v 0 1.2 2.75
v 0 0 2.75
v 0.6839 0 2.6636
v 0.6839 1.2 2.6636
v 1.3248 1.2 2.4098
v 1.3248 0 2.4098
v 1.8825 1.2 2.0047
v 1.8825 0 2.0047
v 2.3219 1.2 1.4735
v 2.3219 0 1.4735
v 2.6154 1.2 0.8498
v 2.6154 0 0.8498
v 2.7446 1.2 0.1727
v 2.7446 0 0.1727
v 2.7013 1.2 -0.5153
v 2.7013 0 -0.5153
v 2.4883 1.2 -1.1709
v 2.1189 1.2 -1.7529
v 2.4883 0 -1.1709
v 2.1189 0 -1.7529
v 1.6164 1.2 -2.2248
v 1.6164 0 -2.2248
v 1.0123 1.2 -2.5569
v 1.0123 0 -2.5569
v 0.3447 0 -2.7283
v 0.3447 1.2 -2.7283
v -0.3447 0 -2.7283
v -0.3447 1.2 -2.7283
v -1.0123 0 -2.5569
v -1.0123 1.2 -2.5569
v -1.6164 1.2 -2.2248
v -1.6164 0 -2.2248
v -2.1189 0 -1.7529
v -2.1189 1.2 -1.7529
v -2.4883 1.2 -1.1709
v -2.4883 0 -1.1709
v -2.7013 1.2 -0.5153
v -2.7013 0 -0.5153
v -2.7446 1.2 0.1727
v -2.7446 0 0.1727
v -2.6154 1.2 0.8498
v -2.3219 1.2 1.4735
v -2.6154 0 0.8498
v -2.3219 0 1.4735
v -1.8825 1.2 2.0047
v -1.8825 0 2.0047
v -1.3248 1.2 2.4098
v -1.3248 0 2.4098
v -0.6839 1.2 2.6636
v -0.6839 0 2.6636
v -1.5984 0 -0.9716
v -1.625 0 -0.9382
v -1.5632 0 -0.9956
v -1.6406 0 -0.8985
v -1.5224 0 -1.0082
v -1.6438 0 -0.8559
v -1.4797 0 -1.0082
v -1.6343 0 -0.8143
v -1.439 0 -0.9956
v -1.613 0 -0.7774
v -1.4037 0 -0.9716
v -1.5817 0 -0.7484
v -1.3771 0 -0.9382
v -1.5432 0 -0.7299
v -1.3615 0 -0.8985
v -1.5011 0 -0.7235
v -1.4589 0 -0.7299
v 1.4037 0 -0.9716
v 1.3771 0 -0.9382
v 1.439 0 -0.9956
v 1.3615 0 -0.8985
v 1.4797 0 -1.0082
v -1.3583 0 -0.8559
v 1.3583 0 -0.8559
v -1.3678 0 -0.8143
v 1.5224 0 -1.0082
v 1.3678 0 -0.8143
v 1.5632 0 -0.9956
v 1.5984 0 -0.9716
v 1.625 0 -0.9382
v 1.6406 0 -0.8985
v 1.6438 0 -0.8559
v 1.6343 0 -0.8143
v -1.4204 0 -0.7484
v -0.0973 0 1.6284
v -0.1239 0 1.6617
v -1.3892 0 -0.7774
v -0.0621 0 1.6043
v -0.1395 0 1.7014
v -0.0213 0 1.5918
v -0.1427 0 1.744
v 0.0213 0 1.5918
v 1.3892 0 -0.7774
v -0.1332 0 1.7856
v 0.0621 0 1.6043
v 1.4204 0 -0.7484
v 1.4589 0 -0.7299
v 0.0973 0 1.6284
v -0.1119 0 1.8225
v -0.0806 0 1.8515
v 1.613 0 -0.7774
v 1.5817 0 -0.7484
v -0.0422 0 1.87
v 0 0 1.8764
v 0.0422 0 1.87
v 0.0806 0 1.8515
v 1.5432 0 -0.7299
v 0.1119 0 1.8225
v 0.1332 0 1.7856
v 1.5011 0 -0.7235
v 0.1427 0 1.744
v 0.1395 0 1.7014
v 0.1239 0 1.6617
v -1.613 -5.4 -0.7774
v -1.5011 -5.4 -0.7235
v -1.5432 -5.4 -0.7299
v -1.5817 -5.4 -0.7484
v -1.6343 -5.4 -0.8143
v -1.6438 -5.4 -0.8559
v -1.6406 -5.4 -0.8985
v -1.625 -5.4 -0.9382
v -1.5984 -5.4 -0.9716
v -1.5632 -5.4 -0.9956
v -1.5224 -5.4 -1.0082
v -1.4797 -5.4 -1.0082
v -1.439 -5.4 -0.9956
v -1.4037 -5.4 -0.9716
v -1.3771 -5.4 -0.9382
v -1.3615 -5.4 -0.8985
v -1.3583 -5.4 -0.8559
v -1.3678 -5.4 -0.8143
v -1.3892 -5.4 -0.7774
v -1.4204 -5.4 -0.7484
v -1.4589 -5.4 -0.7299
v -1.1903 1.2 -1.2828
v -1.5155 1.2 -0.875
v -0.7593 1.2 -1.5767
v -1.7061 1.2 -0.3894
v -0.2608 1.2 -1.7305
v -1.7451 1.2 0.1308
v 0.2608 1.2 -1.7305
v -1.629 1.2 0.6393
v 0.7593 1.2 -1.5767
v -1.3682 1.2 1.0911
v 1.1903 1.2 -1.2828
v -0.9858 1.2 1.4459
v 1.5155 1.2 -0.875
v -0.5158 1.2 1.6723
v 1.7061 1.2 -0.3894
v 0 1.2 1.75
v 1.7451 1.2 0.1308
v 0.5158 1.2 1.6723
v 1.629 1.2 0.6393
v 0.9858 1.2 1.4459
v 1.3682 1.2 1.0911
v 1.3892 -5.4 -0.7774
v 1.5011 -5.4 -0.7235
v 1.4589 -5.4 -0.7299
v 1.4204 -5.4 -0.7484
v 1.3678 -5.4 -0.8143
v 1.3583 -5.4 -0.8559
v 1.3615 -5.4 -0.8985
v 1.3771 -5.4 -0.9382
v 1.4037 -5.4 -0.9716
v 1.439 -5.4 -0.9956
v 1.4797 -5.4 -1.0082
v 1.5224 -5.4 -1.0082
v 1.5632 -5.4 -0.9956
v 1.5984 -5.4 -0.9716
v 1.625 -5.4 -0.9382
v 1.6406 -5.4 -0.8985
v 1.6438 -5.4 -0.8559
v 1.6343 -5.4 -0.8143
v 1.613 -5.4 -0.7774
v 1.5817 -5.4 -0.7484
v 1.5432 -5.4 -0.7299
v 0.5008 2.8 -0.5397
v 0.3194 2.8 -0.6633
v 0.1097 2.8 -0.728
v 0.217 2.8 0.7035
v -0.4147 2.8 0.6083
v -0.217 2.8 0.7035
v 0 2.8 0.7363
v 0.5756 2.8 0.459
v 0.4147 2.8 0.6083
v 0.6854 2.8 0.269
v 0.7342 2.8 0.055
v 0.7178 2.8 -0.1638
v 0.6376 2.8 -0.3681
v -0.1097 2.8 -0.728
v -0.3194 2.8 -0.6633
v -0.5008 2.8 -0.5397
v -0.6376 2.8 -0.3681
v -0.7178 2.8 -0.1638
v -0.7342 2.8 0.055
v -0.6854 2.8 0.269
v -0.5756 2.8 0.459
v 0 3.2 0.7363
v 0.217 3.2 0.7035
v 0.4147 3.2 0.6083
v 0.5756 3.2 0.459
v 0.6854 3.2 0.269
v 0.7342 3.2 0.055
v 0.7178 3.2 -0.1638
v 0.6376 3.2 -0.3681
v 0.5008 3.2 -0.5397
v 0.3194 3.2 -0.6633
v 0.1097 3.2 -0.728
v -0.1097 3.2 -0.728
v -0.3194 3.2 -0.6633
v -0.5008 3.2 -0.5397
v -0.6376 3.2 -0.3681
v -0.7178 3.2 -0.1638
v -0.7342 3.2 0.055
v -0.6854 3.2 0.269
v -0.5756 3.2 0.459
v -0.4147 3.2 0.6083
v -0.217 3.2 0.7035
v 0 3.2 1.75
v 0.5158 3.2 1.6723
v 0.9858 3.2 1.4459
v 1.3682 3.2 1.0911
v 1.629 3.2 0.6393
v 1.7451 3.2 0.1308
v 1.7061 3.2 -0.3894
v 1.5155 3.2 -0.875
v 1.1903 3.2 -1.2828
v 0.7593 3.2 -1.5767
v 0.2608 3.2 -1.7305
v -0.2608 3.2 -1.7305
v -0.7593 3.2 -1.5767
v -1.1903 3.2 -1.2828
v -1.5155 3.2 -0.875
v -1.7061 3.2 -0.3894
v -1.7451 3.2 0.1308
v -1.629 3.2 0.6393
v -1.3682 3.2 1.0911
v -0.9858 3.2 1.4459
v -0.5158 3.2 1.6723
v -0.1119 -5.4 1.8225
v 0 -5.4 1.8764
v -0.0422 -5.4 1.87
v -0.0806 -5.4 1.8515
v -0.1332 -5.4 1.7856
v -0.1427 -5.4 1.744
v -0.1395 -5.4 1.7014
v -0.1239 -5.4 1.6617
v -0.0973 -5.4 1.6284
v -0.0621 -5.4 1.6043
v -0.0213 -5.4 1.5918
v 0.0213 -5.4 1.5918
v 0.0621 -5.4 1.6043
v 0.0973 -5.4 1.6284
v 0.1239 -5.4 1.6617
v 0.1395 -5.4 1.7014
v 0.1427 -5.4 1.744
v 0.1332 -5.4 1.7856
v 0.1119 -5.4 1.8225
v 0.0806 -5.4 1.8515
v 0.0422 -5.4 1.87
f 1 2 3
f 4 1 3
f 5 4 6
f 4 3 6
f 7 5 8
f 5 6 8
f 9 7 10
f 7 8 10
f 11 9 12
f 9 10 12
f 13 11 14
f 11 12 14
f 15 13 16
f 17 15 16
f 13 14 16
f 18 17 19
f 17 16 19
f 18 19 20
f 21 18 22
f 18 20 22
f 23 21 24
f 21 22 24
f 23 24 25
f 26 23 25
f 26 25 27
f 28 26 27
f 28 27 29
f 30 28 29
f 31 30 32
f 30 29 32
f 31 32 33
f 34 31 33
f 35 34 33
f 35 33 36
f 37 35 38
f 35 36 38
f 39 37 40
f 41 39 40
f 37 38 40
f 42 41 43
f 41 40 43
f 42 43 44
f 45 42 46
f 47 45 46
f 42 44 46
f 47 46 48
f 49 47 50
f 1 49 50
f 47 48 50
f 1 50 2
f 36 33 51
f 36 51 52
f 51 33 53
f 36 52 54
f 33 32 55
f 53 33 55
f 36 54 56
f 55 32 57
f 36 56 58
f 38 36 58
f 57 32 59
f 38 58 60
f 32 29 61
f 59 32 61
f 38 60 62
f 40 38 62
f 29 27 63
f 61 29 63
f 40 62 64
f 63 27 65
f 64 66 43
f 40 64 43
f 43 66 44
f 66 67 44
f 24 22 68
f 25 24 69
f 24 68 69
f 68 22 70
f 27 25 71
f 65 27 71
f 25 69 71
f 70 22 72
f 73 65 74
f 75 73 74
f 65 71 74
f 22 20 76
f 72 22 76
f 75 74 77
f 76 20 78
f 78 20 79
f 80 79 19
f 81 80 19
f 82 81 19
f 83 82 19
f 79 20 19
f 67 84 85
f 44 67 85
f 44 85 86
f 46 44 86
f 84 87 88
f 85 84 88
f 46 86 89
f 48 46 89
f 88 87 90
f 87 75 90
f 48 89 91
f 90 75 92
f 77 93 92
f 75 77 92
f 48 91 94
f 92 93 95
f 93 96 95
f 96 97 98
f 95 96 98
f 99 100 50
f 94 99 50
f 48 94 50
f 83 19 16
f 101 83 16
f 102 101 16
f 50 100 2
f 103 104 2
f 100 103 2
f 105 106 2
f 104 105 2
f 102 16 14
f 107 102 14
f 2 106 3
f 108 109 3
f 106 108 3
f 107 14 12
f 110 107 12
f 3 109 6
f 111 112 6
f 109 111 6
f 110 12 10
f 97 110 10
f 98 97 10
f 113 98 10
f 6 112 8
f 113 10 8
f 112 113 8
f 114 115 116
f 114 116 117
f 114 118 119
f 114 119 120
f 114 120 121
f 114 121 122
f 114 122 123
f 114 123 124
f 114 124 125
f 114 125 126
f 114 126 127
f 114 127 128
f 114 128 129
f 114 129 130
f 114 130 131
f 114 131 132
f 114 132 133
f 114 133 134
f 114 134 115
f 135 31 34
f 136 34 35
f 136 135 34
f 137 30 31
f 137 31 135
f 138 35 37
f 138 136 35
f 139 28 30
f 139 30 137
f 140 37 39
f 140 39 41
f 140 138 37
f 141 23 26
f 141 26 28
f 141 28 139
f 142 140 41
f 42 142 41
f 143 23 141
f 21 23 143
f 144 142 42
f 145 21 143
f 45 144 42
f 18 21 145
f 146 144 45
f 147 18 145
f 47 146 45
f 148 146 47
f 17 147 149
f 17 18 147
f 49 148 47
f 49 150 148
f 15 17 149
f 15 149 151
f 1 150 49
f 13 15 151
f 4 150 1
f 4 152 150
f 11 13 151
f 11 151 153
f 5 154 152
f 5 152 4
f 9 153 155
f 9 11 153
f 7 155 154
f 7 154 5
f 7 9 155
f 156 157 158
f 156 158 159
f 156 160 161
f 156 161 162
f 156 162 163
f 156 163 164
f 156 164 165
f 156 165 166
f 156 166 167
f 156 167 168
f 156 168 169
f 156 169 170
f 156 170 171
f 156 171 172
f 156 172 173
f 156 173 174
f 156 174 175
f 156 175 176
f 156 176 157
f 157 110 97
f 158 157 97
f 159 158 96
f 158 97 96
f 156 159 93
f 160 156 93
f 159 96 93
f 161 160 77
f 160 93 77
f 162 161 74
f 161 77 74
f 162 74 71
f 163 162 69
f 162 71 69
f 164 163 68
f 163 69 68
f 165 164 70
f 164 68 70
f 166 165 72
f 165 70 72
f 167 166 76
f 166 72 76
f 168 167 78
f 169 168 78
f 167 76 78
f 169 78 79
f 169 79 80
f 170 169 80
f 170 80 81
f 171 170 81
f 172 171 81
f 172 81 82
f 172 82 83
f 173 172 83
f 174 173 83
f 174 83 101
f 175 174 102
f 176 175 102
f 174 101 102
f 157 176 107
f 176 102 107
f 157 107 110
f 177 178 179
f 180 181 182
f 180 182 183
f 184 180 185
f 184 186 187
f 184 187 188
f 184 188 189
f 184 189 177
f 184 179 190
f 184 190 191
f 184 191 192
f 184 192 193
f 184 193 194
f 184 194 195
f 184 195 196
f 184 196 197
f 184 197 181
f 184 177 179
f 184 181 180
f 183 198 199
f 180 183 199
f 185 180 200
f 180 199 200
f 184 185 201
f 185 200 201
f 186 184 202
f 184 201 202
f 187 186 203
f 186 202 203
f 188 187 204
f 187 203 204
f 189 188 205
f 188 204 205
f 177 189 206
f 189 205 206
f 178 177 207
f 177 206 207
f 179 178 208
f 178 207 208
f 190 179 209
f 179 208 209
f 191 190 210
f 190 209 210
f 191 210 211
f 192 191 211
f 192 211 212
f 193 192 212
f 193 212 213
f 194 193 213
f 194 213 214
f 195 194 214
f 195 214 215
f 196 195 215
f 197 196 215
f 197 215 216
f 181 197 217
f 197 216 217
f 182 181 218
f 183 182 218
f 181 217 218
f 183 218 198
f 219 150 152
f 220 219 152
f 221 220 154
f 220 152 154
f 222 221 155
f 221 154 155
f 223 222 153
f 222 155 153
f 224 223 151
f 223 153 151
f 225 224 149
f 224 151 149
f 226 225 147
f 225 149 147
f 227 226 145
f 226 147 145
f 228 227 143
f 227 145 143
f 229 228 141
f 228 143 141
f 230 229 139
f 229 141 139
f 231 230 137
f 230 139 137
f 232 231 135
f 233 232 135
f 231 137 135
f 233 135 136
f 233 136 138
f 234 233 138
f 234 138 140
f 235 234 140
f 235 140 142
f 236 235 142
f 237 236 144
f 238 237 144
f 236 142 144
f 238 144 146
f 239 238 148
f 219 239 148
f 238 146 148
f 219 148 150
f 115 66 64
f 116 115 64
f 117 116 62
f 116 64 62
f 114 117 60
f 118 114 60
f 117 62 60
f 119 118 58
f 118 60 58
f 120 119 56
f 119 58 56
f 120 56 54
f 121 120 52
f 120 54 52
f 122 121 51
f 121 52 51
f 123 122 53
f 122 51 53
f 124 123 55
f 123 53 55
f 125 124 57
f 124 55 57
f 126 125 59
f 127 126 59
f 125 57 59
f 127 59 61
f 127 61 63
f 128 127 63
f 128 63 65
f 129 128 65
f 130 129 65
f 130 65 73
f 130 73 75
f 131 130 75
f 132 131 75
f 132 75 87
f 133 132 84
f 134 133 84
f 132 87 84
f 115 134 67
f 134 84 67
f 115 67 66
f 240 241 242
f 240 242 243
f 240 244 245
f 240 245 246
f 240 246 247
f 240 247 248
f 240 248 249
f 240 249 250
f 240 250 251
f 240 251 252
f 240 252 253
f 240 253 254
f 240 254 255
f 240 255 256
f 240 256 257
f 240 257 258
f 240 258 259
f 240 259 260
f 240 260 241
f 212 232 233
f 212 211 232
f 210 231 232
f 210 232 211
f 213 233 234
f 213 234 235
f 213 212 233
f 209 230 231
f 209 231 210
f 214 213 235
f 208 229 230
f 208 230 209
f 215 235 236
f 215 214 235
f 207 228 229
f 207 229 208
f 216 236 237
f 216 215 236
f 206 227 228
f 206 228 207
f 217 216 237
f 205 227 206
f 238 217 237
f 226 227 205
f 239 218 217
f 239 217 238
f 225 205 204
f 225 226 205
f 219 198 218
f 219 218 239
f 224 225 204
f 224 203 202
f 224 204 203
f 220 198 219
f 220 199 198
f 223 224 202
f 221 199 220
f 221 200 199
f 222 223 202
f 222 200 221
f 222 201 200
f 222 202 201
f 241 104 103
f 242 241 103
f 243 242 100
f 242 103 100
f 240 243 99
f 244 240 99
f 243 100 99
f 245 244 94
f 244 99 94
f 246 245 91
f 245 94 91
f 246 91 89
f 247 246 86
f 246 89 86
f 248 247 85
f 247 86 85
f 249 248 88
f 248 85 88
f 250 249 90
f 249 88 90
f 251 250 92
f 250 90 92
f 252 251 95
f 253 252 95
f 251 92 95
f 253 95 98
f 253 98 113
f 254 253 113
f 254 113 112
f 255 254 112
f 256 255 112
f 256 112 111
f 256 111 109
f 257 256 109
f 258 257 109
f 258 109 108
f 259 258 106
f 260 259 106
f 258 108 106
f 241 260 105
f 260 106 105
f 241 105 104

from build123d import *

# Parameters (mm, degrees)
SKETCH1_R           = 2.75
BOSS_EXTRUDE1_DEPTH = 1.2
SKETCH2_R           = 1.75
BOSS_EXTRUDE2_DEPTH = 2
SKETCH3_R           = 0.736254348
CUT_EXTRUDE1_DEPTH  = 0.4
SKETCH4_R           = 0.143122077
BOSS_EXTRUDE3_DEPTH = 5.4


with BuildPart() as part:
    # Sketch1 → Boss-Extrude1 (new body)
    with BuildSketch(Plane(origin=(0, 0, 0), x_dir=(1, 0, 0), z_dir=(0, 1, 0))):
        with Locations(Location((0, 0, 0), (0, 0, 270))):
            Circle(SKETCH1_R)
    extrude(amount=BOSS_EXTRUDE1_DEPTH)

    # Sketch2 → Boss-Extrude2 (add)
    with BuildSketch(Plane(origin=(0, 1.2, 0), x_dir=(1, 0, 0), z_dir=(0, 1, 0))):
        with Locations(Location((0, 0, 0), (0, 0, 270))):
            Circle(SKETCH2_R)
    extrude(amount=BOSS_EXTRUDE2_DEPTH)

    # Sketch3 → Cut-Extrude1 (cut)
    with BuildSketch(Plane(origin=(0, 3.2, 0), x_dir=(1, 0, 0), z_dir=(0, 1, 0))):
        with Locations(Location((0, 0, 0), (0, 0, 270))):
            Circle(SKETCH3_R)
    extrude(amount=-CUT_EXTRUDE1_DEPTH, mode=Mode.SUBTRACT)

    # Sketch4 → Boss-Extrude3 (add)
    with BuildSketch(Plane.XZ):
        with Locations(Location((0, 1.733276442, 0), (0, 0, 90))):
            Circle(SKETCH4_R)
        with Locations(Location((1.501061431, -0.866638221, 0), (0, 0, 90))):
            Circle(SKETCH4_R)
        with Locations(Location((-1.501061431, -0.866638221, 0), (0, 0, 90))):
            Circle(SKETCH4_R)
    extrude(amount=BOSS_EXTRUDE3_DEPTH)


solid = part.part
